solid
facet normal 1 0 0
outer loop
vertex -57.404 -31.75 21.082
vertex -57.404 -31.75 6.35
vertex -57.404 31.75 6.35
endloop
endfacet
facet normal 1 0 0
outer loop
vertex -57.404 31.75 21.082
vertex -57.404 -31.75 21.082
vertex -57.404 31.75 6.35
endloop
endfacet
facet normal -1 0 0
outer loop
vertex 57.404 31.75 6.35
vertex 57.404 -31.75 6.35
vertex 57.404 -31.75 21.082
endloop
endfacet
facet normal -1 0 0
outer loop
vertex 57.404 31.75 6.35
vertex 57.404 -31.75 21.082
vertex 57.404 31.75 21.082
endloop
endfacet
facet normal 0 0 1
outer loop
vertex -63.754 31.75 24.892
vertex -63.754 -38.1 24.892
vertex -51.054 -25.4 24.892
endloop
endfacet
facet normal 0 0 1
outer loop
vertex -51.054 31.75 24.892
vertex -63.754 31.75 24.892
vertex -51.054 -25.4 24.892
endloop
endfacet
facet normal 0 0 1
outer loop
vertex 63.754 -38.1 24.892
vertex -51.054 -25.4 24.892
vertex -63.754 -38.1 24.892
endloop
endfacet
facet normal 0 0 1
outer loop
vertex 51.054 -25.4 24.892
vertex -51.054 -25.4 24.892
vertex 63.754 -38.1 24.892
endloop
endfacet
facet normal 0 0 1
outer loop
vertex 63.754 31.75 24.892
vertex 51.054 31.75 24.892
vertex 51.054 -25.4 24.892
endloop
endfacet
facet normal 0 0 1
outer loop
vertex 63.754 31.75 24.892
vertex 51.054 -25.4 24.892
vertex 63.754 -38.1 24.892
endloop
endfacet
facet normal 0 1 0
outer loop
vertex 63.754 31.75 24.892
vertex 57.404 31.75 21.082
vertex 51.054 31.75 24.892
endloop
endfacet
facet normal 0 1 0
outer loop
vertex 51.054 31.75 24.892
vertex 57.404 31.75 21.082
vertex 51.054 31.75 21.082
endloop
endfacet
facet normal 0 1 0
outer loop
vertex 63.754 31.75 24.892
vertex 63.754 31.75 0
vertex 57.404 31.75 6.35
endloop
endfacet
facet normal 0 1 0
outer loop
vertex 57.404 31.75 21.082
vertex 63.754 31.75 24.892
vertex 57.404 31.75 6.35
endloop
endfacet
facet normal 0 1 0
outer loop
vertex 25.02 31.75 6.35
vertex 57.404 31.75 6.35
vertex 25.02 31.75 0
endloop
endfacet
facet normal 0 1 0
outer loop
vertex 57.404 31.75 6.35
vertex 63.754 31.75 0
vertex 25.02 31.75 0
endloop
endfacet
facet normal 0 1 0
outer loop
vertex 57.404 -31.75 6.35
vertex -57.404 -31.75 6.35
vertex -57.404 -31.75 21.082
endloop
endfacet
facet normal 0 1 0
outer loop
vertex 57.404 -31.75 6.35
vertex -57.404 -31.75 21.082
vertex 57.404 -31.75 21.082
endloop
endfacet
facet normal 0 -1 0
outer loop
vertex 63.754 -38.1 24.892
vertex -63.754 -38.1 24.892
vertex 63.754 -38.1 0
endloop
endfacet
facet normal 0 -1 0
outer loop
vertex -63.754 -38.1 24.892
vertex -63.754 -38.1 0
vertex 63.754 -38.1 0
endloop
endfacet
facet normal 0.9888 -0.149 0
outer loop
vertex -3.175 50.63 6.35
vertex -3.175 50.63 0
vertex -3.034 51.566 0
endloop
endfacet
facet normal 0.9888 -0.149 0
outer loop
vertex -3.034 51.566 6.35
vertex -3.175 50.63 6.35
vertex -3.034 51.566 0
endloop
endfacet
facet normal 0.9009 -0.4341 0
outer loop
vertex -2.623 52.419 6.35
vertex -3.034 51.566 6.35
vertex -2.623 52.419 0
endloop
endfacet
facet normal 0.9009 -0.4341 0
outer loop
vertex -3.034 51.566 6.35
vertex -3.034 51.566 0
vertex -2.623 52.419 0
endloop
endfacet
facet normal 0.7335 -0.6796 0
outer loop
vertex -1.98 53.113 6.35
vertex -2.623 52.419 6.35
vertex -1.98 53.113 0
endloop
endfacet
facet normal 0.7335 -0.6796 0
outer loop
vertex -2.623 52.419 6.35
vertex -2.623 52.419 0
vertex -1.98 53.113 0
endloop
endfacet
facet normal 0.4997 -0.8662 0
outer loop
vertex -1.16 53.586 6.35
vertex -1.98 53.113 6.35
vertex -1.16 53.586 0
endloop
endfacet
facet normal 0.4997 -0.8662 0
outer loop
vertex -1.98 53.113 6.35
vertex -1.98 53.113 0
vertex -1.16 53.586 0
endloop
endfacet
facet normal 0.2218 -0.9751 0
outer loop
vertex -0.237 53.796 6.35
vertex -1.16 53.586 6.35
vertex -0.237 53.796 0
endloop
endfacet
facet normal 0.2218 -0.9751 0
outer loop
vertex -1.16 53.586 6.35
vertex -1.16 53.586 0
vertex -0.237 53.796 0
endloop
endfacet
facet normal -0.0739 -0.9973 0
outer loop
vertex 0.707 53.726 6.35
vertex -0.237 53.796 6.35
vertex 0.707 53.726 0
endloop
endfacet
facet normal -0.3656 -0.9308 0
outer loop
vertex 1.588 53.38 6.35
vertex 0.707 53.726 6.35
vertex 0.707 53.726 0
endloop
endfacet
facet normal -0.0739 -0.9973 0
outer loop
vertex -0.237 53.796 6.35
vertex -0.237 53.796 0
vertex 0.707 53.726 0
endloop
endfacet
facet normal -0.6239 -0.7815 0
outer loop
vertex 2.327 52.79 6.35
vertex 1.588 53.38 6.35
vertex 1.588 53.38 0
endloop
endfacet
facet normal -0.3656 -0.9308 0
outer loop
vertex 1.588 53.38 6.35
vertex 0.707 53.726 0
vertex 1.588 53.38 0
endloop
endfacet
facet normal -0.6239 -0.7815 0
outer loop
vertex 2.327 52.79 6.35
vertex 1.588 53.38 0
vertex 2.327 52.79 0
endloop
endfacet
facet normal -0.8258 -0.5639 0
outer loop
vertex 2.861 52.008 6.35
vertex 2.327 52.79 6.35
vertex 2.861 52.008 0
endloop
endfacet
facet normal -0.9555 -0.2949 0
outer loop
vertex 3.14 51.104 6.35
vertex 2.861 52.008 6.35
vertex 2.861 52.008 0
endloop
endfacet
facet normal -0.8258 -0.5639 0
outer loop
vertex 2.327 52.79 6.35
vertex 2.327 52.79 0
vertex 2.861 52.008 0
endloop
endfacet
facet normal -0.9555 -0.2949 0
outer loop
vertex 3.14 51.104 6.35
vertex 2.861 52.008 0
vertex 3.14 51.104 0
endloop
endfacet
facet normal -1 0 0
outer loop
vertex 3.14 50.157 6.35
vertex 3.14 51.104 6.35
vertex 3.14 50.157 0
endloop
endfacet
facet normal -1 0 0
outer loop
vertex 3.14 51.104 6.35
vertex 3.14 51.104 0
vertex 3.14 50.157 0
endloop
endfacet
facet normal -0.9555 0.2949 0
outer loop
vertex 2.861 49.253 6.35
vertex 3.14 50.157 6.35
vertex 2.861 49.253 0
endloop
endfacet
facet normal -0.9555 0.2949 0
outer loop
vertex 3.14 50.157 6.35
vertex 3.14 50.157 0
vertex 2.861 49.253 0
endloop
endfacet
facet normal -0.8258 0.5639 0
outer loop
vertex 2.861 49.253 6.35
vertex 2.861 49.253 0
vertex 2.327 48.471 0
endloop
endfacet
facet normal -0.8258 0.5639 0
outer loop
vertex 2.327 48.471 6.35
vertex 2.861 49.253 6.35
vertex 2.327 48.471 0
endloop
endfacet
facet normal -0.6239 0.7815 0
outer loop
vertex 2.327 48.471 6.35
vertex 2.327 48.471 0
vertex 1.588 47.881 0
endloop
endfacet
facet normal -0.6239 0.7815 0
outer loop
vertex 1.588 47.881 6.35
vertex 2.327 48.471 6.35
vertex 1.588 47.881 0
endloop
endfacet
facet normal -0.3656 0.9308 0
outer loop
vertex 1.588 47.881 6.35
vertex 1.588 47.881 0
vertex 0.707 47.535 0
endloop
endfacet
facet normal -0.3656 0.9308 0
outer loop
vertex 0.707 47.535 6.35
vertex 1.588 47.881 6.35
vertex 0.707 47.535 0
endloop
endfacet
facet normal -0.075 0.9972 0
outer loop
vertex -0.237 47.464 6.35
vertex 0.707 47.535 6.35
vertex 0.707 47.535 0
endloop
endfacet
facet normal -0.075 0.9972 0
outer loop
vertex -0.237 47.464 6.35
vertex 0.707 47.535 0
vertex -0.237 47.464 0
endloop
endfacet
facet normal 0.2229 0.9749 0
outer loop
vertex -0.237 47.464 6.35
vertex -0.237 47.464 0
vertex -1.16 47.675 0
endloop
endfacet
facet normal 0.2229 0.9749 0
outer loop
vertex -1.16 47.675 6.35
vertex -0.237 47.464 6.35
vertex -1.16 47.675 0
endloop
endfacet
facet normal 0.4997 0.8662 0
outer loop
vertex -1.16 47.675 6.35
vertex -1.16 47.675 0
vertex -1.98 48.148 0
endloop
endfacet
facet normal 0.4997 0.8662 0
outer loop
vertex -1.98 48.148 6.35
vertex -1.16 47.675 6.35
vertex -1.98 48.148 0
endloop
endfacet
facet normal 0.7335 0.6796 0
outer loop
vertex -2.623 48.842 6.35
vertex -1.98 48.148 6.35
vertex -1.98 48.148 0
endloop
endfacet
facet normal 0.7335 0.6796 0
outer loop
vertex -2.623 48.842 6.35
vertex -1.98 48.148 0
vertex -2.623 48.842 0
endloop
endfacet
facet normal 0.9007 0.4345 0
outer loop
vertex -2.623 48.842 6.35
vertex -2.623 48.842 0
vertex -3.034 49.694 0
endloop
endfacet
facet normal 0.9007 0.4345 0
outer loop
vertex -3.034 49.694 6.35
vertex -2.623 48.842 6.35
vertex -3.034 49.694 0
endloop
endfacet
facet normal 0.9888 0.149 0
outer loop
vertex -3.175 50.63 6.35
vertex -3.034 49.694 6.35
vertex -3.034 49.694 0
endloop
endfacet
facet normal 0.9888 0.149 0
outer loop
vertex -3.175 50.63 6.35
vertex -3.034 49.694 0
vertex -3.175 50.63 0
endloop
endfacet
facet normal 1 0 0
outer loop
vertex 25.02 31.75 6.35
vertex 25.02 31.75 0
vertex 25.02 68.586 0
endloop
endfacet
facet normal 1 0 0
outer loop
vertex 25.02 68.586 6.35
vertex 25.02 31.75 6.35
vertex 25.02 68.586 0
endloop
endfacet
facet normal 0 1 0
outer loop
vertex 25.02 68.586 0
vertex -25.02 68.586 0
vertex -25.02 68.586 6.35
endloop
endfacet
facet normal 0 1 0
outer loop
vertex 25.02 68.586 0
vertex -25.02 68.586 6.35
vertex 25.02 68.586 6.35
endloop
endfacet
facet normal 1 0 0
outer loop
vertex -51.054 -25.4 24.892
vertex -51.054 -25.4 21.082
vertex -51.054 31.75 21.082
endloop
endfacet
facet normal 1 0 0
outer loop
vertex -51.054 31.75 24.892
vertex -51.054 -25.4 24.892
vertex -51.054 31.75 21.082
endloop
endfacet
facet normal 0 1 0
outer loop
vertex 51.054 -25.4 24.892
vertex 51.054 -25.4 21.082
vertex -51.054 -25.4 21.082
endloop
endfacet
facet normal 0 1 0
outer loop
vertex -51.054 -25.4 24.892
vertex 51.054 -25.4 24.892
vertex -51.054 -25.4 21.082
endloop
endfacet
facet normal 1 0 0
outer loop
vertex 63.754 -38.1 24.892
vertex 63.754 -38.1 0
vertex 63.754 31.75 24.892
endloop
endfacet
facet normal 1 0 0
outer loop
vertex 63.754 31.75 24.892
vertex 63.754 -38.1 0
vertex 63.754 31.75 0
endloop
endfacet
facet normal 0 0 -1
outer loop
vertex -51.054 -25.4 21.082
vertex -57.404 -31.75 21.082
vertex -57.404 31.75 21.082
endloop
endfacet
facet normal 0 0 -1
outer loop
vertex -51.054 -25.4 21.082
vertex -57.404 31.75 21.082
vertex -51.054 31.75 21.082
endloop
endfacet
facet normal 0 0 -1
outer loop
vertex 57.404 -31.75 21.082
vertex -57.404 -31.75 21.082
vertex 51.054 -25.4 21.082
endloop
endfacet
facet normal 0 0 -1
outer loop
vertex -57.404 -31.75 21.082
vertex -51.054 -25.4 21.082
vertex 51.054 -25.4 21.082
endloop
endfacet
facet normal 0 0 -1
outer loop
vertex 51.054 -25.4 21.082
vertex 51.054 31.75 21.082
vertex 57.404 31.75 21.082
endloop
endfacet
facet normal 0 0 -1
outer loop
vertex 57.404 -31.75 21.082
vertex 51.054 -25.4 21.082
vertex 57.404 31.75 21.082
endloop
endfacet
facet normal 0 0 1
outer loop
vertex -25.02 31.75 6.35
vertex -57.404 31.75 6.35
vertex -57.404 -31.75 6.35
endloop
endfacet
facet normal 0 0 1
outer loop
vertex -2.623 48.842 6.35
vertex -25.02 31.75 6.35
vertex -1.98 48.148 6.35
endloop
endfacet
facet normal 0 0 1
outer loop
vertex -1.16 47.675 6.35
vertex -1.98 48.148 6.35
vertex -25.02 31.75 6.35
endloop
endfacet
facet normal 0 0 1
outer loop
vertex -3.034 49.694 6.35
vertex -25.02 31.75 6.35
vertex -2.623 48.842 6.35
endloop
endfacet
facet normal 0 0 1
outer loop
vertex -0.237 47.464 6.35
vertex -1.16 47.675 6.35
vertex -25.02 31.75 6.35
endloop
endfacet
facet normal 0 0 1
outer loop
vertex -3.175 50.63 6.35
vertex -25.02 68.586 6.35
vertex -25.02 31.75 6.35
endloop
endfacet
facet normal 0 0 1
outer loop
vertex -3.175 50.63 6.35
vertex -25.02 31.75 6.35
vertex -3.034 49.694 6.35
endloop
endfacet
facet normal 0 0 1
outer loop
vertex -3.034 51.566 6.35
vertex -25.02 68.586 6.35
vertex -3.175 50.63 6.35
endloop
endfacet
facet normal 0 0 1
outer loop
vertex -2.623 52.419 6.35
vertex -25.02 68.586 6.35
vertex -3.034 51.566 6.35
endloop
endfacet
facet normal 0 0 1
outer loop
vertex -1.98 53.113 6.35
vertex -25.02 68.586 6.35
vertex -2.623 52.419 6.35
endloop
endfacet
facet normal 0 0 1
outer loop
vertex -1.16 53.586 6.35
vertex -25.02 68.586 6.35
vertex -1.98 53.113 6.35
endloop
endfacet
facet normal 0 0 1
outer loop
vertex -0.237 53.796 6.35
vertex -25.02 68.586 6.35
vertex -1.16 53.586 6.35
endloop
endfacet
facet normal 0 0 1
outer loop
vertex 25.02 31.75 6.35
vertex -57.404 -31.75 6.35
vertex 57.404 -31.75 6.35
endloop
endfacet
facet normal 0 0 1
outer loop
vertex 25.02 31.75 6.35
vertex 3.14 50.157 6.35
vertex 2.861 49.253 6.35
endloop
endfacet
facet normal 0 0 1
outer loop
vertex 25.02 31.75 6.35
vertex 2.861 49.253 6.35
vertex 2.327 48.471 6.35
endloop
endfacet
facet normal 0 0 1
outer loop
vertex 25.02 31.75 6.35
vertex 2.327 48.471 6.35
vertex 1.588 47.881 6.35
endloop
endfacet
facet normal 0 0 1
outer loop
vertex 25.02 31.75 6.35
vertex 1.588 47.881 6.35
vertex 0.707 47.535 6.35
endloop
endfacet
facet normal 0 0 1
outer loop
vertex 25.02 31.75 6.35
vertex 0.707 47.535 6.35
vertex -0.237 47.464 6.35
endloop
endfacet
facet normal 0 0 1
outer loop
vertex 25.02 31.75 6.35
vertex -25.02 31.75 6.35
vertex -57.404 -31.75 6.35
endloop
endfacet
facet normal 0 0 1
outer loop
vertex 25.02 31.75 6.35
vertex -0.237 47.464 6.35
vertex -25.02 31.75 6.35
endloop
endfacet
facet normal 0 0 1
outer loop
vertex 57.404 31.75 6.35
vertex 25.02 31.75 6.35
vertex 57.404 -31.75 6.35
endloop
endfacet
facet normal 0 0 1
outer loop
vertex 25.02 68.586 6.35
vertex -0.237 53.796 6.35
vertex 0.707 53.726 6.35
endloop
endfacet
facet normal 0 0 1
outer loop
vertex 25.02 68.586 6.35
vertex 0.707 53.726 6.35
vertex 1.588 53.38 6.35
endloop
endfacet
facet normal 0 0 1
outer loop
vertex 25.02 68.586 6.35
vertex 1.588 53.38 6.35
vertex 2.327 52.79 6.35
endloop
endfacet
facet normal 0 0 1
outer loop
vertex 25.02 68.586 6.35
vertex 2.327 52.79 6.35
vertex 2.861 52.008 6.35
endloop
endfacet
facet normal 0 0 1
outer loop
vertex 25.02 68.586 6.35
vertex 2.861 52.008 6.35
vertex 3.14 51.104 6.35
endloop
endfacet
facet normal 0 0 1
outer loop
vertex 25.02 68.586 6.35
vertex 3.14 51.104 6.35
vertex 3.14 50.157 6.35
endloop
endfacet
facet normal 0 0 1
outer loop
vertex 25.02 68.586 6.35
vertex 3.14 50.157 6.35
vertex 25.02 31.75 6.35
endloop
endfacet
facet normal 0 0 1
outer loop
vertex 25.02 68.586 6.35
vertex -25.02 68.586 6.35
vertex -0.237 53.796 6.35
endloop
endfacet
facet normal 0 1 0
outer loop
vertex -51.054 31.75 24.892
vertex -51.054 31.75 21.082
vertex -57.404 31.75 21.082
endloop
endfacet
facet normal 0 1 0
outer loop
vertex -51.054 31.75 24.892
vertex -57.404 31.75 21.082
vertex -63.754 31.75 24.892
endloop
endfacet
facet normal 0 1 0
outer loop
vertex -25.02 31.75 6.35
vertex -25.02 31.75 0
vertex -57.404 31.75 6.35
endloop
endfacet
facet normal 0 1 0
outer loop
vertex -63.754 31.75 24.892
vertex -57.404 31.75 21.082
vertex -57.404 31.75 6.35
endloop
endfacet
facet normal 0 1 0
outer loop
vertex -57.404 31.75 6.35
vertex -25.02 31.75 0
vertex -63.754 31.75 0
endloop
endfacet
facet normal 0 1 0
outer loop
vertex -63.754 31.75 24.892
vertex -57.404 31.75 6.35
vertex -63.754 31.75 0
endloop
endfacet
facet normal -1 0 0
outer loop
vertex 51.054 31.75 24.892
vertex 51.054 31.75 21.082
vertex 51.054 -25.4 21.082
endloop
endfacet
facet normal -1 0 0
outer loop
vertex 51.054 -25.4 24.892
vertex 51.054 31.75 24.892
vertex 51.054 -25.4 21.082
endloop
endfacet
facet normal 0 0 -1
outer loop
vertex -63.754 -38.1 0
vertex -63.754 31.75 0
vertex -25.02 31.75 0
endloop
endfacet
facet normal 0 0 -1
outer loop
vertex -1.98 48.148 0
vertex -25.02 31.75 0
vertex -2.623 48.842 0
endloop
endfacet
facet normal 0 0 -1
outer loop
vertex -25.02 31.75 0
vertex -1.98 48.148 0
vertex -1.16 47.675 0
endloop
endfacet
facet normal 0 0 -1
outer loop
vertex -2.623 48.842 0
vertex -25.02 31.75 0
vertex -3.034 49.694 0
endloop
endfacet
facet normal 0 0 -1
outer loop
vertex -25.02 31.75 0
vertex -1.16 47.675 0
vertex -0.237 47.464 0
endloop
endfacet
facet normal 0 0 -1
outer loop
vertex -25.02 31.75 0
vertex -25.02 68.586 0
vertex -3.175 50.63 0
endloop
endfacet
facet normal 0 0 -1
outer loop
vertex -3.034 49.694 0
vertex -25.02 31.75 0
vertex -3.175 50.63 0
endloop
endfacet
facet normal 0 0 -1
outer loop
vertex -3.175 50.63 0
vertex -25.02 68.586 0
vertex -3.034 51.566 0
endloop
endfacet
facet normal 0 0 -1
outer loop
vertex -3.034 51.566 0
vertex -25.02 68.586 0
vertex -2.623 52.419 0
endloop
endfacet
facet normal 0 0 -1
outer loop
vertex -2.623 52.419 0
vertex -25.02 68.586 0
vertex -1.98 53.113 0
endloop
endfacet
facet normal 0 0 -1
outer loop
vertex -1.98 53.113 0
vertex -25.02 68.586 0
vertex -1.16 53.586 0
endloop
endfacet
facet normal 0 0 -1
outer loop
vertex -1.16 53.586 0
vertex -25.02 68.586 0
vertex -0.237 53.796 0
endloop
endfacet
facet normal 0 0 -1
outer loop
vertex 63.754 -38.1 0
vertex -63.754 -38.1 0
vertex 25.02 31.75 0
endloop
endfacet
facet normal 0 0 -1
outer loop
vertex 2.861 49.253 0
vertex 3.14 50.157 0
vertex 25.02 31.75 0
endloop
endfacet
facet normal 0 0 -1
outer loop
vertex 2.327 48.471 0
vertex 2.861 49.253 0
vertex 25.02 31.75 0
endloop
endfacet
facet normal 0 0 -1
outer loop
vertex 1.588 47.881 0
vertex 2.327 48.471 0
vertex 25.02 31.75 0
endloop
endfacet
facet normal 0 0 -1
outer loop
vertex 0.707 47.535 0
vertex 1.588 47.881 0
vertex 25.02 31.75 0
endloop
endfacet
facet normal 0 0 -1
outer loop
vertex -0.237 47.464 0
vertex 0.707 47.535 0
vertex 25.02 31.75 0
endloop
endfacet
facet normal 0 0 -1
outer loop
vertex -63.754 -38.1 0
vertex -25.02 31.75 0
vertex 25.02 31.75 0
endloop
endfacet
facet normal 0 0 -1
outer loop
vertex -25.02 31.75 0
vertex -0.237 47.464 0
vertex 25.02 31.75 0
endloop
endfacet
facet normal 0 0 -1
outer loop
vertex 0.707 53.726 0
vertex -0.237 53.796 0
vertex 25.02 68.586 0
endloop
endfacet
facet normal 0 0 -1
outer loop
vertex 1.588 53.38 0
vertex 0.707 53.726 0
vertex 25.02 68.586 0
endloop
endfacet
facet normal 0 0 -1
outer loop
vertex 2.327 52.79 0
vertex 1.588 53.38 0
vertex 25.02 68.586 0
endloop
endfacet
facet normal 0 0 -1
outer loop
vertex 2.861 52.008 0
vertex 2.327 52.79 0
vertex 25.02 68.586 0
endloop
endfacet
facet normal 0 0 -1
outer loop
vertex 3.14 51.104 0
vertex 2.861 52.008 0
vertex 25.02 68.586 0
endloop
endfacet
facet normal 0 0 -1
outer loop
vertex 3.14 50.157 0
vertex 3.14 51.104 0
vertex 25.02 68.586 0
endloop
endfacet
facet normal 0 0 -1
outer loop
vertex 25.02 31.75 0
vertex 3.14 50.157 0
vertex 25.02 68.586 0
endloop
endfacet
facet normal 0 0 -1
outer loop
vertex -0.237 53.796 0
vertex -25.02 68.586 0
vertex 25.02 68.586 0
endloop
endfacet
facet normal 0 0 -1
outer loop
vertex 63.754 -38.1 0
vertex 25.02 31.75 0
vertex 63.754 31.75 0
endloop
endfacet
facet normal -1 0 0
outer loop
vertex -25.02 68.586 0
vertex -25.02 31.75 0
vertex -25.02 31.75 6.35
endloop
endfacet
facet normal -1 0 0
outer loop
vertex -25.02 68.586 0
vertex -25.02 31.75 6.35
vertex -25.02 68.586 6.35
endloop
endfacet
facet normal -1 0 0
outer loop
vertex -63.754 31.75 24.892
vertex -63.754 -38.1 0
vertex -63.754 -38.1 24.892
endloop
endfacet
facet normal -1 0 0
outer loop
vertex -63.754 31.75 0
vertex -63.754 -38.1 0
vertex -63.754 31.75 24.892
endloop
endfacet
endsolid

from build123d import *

# Parameters (mm, degrees)
F0_W      = 114.808
F0_H      = 63.5
F1_DEPTH  = 6.35
F2_W      = 6.35
F2_H      = 63.5
F3_DEPTH  = 21.082
F4_W      = 121.158
F4_H      = 6.35
F5_DEPTH  = 21.082
F6_W      = 6.35
F6_H      = 69.85
F7_DEPTH  = 21.082
F8_W      = 6.35
F8_H      = 63.5
F9_DEPTH  = 3.81
F10_W     = 108.458
F10_H     = 6.35
F11_DEPTH = 3.81
F12_W     = 6.35
F12_H     = 57.15
F13_DEPTH = 3.81
F14_W     = 50.0406362116
F14_H     = 73.5886525363
F15_DEPTH = 6.35
F17_D     = 6.35


with BuildPart() as f1:
    # F0 (on Top) → F1 (new body)
    with BuildSketch(Plane.XY):
        Rectangle(F0_W, F0_H)
    extrude(amount=F1_DEPTH)

    # F2 (on Top) → F3 (join)
    with BuildSketch(Plane.XY):
        with Locations((-60.579, 0)):
            Rectangle(F2_W, F2_H)
    extrude(amount=F3_DEPTH)

    # F4 (on Top) → F5 (join)
    with BuildSketch(Plane.XY):
        with Locations((-3.175, -34.925)):
            Rectangle(F4_W, F4_H)
    extrude(amount=F5_DEPTH)

    # F6 (on Top) → F7 (join)
    with BuildSketch(Plane.XY):
        with Locations((60.579, -3.175)):
            Rectangle(F6_W, F6_H)
    extrude(amount=F7_DEPTH)

    # F8 (on face) → F9 (join)
    with BuildSketch(Plane.XY.offset(21.082)):
        with Locations((54.229, 0)):
            Rectangle(F8_W, F8_H)
        Polygon((63.754, -38.1), (63.754, 31.75), (57.404, 31.75), (57.404, -31.75), (51.054, -31.75), (51.054, -38.1), align=None)
    extrude(amount=F9_DEPTH)

    # F10 (on face) → F11 (join)
    with BuildSketch(Plane.XY.offset(21.082)):
        Polygon((-63.754, -25.4), (-63.754, -38.1), (51.054, -38.1), (51.054, -31.75), (-57.404, -31.75), (-57.404, -25.4), align=None)
        with Locations((-3.175, -28.575)):
            Rectangle(F10_W, F10_H)
    extrude(amount=F11_DEPTH)

    # F12 (on face) → F13 (join)
    with BuildSketch(Plane.XY.offset(21.082)):
        with Locations((-60.579, 3.175)):
            Rectangle(F12_W, F12_H)
        with Locations((-54.229, 3.175)):
            Rectangle(F12_W, F12_H)
    extrude(amount=F13_DEPTH)

    # F14 (on Top) → F15 (join)
    with BuildSketch(Plane.XY):
        with Locations((0, 31.7919999361)):
            Rectangle(F14_W, F14_H)
    extrude(amount=F15_DEPTH)

    # F17 (through all)
    with Locations(Plane.XY.offset(6.35)):
        with Locations((0, 50.6303012371)):
            Hole(F17_D / 2)


solid = f1.part
